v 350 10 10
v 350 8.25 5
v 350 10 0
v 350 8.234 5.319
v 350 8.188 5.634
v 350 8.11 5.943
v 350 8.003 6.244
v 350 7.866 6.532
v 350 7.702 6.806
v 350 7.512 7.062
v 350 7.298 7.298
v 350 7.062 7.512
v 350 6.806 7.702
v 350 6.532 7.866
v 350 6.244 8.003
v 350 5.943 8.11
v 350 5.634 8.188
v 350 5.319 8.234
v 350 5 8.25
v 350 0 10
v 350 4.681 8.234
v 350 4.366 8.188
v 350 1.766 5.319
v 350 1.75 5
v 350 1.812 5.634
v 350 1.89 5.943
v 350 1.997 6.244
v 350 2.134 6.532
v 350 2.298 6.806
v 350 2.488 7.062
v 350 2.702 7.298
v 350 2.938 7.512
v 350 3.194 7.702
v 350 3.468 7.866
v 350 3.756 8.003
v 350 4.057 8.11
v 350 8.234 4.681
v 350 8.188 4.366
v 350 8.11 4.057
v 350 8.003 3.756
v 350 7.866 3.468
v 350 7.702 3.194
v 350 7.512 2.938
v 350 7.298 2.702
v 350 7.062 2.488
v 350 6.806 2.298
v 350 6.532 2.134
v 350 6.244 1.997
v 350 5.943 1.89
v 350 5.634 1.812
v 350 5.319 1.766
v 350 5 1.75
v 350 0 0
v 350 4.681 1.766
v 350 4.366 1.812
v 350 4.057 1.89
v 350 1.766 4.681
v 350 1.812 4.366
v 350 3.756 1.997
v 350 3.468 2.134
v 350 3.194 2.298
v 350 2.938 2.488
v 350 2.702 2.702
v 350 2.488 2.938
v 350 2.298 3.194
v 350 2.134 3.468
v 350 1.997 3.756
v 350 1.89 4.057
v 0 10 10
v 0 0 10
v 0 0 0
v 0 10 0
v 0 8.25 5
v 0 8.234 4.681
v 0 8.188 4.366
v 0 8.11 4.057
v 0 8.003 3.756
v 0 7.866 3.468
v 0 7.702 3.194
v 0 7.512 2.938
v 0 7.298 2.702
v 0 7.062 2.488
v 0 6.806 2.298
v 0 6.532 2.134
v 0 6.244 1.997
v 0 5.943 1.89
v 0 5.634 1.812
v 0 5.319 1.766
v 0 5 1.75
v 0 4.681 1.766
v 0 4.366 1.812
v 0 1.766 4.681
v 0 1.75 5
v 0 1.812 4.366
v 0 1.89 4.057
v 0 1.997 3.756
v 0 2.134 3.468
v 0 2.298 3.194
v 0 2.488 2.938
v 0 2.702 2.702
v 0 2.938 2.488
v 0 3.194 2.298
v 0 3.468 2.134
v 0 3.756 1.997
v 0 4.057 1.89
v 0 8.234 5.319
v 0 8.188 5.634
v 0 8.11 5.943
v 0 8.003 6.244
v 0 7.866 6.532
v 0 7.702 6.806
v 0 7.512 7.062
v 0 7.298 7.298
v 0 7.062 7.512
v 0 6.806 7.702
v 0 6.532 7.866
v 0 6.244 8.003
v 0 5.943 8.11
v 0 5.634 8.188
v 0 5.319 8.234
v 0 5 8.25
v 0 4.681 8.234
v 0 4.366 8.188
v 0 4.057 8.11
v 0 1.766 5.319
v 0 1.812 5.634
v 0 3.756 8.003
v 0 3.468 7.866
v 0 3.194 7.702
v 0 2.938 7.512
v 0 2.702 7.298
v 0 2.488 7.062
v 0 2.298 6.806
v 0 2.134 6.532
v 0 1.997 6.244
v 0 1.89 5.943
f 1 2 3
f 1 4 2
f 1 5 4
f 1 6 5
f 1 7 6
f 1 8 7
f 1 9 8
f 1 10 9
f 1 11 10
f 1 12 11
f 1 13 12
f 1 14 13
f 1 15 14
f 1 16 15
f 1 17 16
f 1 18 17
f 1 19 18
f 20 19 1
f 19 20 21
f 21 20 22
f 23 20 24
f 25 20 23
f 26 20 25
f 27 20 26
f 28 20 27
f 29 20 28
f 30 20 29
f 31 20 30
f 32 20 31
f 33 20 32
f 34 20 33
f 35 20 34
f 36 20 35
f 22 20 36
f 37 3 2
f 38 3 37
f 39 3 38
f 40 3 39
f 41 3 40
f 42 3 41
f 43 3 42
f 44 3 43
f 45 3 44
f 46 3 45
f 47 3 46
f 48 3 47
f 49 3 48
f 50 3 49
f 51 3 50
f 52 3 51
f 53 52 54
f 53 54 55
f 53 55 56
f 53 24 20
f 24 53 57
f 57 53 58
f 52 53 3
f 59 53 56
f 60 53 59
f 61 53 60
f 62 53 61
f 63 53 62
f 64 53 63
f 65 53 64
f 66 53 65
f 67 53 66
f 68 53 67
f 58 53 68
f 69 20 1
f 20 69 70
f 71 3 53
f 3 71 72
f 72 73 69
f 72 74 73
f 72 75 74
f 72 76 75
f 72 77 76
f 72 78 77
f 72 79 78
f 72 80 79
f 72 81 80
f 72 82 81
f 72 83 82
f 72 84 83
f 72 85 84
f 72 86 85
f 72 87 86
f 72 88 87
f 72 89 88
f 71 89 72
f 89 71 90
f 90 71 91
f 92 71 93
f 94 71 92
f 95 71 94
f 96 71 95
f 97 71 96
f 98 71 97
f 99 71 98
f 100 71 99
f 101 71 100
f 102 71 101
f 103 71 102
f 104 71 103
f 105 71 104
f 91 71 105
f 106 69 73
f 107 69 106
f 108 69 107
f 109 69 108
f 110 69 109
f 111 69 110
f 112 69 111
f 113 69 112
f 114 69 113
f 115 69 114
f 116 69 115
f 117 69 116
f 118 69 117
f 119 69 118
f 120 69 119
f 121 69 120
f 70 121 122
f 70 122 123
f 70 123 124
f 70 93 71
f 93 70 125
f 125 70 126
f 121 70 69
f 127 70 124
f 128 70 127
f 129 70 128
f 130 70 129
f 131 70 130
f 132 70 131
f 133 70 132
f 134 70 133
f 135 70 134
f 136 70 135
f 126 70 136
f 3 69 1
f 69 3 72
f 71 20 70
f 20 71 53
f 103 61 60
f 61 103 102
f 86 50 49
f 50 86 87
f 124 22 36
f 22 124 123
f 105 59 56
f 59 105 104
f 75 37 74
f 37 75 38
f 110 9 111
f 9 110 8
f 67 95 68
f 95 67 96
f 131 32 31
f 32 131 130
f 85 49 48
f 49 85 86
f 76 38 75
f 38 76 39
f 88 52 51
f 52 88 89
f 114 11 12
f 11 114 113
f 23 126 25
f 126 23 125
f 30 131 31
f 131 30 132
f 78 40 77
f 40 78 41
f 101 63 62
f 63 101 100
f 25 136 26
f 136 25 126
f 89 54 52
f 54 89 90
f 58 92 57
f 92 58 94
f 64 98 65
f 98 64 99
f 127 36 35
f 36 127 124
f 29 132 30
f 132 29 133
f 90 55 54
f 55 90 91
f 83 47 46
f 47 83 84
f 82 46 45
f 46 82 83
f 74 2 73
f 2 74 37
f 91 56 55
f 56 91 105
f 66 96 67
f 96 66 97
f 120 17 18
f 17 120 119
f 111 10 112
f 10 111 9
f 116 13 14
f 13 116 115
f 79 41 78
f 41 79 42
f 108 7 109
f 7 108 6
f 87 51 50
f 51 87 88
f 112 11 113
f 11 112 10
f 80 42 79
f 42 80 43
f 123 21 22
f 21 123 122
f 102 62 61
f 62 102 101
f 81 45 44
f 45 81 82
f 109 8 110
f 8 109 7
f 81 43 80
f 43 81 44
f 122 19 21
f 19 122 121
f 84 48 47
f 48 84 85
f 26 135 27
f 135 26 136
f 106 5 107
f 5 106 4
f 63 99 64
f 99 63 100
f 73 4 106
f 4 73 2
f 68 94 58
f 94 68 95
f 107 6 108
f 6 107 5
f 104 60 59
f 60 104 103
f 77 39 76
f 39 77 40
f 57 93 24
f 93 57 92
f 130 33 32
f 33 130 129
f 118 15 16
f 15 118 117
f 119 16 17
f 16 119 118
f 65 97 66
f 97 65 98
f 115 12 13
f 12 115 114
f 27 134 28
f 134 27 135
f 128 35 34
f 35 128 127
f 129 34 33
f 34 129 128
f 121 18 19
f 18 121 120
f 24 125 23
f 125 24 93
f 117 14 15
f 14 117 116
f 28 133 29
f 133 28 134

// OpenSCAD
// Part 18: Corner post segment (SE, UPPER)
// Same geometry as generic corner post segment.
bar = 10;
len = 350;
rod_d = 6.5;

module corner_post_segment_350() {
    difference() {
        cube([len, bar, bar], center=false);
        translate([0, bar/2, bar/2])
            rotate([0,90,0])
                cylinder(d=rod_d, h=len, $fn=64);
    }
}

corner_post_segment_350();
